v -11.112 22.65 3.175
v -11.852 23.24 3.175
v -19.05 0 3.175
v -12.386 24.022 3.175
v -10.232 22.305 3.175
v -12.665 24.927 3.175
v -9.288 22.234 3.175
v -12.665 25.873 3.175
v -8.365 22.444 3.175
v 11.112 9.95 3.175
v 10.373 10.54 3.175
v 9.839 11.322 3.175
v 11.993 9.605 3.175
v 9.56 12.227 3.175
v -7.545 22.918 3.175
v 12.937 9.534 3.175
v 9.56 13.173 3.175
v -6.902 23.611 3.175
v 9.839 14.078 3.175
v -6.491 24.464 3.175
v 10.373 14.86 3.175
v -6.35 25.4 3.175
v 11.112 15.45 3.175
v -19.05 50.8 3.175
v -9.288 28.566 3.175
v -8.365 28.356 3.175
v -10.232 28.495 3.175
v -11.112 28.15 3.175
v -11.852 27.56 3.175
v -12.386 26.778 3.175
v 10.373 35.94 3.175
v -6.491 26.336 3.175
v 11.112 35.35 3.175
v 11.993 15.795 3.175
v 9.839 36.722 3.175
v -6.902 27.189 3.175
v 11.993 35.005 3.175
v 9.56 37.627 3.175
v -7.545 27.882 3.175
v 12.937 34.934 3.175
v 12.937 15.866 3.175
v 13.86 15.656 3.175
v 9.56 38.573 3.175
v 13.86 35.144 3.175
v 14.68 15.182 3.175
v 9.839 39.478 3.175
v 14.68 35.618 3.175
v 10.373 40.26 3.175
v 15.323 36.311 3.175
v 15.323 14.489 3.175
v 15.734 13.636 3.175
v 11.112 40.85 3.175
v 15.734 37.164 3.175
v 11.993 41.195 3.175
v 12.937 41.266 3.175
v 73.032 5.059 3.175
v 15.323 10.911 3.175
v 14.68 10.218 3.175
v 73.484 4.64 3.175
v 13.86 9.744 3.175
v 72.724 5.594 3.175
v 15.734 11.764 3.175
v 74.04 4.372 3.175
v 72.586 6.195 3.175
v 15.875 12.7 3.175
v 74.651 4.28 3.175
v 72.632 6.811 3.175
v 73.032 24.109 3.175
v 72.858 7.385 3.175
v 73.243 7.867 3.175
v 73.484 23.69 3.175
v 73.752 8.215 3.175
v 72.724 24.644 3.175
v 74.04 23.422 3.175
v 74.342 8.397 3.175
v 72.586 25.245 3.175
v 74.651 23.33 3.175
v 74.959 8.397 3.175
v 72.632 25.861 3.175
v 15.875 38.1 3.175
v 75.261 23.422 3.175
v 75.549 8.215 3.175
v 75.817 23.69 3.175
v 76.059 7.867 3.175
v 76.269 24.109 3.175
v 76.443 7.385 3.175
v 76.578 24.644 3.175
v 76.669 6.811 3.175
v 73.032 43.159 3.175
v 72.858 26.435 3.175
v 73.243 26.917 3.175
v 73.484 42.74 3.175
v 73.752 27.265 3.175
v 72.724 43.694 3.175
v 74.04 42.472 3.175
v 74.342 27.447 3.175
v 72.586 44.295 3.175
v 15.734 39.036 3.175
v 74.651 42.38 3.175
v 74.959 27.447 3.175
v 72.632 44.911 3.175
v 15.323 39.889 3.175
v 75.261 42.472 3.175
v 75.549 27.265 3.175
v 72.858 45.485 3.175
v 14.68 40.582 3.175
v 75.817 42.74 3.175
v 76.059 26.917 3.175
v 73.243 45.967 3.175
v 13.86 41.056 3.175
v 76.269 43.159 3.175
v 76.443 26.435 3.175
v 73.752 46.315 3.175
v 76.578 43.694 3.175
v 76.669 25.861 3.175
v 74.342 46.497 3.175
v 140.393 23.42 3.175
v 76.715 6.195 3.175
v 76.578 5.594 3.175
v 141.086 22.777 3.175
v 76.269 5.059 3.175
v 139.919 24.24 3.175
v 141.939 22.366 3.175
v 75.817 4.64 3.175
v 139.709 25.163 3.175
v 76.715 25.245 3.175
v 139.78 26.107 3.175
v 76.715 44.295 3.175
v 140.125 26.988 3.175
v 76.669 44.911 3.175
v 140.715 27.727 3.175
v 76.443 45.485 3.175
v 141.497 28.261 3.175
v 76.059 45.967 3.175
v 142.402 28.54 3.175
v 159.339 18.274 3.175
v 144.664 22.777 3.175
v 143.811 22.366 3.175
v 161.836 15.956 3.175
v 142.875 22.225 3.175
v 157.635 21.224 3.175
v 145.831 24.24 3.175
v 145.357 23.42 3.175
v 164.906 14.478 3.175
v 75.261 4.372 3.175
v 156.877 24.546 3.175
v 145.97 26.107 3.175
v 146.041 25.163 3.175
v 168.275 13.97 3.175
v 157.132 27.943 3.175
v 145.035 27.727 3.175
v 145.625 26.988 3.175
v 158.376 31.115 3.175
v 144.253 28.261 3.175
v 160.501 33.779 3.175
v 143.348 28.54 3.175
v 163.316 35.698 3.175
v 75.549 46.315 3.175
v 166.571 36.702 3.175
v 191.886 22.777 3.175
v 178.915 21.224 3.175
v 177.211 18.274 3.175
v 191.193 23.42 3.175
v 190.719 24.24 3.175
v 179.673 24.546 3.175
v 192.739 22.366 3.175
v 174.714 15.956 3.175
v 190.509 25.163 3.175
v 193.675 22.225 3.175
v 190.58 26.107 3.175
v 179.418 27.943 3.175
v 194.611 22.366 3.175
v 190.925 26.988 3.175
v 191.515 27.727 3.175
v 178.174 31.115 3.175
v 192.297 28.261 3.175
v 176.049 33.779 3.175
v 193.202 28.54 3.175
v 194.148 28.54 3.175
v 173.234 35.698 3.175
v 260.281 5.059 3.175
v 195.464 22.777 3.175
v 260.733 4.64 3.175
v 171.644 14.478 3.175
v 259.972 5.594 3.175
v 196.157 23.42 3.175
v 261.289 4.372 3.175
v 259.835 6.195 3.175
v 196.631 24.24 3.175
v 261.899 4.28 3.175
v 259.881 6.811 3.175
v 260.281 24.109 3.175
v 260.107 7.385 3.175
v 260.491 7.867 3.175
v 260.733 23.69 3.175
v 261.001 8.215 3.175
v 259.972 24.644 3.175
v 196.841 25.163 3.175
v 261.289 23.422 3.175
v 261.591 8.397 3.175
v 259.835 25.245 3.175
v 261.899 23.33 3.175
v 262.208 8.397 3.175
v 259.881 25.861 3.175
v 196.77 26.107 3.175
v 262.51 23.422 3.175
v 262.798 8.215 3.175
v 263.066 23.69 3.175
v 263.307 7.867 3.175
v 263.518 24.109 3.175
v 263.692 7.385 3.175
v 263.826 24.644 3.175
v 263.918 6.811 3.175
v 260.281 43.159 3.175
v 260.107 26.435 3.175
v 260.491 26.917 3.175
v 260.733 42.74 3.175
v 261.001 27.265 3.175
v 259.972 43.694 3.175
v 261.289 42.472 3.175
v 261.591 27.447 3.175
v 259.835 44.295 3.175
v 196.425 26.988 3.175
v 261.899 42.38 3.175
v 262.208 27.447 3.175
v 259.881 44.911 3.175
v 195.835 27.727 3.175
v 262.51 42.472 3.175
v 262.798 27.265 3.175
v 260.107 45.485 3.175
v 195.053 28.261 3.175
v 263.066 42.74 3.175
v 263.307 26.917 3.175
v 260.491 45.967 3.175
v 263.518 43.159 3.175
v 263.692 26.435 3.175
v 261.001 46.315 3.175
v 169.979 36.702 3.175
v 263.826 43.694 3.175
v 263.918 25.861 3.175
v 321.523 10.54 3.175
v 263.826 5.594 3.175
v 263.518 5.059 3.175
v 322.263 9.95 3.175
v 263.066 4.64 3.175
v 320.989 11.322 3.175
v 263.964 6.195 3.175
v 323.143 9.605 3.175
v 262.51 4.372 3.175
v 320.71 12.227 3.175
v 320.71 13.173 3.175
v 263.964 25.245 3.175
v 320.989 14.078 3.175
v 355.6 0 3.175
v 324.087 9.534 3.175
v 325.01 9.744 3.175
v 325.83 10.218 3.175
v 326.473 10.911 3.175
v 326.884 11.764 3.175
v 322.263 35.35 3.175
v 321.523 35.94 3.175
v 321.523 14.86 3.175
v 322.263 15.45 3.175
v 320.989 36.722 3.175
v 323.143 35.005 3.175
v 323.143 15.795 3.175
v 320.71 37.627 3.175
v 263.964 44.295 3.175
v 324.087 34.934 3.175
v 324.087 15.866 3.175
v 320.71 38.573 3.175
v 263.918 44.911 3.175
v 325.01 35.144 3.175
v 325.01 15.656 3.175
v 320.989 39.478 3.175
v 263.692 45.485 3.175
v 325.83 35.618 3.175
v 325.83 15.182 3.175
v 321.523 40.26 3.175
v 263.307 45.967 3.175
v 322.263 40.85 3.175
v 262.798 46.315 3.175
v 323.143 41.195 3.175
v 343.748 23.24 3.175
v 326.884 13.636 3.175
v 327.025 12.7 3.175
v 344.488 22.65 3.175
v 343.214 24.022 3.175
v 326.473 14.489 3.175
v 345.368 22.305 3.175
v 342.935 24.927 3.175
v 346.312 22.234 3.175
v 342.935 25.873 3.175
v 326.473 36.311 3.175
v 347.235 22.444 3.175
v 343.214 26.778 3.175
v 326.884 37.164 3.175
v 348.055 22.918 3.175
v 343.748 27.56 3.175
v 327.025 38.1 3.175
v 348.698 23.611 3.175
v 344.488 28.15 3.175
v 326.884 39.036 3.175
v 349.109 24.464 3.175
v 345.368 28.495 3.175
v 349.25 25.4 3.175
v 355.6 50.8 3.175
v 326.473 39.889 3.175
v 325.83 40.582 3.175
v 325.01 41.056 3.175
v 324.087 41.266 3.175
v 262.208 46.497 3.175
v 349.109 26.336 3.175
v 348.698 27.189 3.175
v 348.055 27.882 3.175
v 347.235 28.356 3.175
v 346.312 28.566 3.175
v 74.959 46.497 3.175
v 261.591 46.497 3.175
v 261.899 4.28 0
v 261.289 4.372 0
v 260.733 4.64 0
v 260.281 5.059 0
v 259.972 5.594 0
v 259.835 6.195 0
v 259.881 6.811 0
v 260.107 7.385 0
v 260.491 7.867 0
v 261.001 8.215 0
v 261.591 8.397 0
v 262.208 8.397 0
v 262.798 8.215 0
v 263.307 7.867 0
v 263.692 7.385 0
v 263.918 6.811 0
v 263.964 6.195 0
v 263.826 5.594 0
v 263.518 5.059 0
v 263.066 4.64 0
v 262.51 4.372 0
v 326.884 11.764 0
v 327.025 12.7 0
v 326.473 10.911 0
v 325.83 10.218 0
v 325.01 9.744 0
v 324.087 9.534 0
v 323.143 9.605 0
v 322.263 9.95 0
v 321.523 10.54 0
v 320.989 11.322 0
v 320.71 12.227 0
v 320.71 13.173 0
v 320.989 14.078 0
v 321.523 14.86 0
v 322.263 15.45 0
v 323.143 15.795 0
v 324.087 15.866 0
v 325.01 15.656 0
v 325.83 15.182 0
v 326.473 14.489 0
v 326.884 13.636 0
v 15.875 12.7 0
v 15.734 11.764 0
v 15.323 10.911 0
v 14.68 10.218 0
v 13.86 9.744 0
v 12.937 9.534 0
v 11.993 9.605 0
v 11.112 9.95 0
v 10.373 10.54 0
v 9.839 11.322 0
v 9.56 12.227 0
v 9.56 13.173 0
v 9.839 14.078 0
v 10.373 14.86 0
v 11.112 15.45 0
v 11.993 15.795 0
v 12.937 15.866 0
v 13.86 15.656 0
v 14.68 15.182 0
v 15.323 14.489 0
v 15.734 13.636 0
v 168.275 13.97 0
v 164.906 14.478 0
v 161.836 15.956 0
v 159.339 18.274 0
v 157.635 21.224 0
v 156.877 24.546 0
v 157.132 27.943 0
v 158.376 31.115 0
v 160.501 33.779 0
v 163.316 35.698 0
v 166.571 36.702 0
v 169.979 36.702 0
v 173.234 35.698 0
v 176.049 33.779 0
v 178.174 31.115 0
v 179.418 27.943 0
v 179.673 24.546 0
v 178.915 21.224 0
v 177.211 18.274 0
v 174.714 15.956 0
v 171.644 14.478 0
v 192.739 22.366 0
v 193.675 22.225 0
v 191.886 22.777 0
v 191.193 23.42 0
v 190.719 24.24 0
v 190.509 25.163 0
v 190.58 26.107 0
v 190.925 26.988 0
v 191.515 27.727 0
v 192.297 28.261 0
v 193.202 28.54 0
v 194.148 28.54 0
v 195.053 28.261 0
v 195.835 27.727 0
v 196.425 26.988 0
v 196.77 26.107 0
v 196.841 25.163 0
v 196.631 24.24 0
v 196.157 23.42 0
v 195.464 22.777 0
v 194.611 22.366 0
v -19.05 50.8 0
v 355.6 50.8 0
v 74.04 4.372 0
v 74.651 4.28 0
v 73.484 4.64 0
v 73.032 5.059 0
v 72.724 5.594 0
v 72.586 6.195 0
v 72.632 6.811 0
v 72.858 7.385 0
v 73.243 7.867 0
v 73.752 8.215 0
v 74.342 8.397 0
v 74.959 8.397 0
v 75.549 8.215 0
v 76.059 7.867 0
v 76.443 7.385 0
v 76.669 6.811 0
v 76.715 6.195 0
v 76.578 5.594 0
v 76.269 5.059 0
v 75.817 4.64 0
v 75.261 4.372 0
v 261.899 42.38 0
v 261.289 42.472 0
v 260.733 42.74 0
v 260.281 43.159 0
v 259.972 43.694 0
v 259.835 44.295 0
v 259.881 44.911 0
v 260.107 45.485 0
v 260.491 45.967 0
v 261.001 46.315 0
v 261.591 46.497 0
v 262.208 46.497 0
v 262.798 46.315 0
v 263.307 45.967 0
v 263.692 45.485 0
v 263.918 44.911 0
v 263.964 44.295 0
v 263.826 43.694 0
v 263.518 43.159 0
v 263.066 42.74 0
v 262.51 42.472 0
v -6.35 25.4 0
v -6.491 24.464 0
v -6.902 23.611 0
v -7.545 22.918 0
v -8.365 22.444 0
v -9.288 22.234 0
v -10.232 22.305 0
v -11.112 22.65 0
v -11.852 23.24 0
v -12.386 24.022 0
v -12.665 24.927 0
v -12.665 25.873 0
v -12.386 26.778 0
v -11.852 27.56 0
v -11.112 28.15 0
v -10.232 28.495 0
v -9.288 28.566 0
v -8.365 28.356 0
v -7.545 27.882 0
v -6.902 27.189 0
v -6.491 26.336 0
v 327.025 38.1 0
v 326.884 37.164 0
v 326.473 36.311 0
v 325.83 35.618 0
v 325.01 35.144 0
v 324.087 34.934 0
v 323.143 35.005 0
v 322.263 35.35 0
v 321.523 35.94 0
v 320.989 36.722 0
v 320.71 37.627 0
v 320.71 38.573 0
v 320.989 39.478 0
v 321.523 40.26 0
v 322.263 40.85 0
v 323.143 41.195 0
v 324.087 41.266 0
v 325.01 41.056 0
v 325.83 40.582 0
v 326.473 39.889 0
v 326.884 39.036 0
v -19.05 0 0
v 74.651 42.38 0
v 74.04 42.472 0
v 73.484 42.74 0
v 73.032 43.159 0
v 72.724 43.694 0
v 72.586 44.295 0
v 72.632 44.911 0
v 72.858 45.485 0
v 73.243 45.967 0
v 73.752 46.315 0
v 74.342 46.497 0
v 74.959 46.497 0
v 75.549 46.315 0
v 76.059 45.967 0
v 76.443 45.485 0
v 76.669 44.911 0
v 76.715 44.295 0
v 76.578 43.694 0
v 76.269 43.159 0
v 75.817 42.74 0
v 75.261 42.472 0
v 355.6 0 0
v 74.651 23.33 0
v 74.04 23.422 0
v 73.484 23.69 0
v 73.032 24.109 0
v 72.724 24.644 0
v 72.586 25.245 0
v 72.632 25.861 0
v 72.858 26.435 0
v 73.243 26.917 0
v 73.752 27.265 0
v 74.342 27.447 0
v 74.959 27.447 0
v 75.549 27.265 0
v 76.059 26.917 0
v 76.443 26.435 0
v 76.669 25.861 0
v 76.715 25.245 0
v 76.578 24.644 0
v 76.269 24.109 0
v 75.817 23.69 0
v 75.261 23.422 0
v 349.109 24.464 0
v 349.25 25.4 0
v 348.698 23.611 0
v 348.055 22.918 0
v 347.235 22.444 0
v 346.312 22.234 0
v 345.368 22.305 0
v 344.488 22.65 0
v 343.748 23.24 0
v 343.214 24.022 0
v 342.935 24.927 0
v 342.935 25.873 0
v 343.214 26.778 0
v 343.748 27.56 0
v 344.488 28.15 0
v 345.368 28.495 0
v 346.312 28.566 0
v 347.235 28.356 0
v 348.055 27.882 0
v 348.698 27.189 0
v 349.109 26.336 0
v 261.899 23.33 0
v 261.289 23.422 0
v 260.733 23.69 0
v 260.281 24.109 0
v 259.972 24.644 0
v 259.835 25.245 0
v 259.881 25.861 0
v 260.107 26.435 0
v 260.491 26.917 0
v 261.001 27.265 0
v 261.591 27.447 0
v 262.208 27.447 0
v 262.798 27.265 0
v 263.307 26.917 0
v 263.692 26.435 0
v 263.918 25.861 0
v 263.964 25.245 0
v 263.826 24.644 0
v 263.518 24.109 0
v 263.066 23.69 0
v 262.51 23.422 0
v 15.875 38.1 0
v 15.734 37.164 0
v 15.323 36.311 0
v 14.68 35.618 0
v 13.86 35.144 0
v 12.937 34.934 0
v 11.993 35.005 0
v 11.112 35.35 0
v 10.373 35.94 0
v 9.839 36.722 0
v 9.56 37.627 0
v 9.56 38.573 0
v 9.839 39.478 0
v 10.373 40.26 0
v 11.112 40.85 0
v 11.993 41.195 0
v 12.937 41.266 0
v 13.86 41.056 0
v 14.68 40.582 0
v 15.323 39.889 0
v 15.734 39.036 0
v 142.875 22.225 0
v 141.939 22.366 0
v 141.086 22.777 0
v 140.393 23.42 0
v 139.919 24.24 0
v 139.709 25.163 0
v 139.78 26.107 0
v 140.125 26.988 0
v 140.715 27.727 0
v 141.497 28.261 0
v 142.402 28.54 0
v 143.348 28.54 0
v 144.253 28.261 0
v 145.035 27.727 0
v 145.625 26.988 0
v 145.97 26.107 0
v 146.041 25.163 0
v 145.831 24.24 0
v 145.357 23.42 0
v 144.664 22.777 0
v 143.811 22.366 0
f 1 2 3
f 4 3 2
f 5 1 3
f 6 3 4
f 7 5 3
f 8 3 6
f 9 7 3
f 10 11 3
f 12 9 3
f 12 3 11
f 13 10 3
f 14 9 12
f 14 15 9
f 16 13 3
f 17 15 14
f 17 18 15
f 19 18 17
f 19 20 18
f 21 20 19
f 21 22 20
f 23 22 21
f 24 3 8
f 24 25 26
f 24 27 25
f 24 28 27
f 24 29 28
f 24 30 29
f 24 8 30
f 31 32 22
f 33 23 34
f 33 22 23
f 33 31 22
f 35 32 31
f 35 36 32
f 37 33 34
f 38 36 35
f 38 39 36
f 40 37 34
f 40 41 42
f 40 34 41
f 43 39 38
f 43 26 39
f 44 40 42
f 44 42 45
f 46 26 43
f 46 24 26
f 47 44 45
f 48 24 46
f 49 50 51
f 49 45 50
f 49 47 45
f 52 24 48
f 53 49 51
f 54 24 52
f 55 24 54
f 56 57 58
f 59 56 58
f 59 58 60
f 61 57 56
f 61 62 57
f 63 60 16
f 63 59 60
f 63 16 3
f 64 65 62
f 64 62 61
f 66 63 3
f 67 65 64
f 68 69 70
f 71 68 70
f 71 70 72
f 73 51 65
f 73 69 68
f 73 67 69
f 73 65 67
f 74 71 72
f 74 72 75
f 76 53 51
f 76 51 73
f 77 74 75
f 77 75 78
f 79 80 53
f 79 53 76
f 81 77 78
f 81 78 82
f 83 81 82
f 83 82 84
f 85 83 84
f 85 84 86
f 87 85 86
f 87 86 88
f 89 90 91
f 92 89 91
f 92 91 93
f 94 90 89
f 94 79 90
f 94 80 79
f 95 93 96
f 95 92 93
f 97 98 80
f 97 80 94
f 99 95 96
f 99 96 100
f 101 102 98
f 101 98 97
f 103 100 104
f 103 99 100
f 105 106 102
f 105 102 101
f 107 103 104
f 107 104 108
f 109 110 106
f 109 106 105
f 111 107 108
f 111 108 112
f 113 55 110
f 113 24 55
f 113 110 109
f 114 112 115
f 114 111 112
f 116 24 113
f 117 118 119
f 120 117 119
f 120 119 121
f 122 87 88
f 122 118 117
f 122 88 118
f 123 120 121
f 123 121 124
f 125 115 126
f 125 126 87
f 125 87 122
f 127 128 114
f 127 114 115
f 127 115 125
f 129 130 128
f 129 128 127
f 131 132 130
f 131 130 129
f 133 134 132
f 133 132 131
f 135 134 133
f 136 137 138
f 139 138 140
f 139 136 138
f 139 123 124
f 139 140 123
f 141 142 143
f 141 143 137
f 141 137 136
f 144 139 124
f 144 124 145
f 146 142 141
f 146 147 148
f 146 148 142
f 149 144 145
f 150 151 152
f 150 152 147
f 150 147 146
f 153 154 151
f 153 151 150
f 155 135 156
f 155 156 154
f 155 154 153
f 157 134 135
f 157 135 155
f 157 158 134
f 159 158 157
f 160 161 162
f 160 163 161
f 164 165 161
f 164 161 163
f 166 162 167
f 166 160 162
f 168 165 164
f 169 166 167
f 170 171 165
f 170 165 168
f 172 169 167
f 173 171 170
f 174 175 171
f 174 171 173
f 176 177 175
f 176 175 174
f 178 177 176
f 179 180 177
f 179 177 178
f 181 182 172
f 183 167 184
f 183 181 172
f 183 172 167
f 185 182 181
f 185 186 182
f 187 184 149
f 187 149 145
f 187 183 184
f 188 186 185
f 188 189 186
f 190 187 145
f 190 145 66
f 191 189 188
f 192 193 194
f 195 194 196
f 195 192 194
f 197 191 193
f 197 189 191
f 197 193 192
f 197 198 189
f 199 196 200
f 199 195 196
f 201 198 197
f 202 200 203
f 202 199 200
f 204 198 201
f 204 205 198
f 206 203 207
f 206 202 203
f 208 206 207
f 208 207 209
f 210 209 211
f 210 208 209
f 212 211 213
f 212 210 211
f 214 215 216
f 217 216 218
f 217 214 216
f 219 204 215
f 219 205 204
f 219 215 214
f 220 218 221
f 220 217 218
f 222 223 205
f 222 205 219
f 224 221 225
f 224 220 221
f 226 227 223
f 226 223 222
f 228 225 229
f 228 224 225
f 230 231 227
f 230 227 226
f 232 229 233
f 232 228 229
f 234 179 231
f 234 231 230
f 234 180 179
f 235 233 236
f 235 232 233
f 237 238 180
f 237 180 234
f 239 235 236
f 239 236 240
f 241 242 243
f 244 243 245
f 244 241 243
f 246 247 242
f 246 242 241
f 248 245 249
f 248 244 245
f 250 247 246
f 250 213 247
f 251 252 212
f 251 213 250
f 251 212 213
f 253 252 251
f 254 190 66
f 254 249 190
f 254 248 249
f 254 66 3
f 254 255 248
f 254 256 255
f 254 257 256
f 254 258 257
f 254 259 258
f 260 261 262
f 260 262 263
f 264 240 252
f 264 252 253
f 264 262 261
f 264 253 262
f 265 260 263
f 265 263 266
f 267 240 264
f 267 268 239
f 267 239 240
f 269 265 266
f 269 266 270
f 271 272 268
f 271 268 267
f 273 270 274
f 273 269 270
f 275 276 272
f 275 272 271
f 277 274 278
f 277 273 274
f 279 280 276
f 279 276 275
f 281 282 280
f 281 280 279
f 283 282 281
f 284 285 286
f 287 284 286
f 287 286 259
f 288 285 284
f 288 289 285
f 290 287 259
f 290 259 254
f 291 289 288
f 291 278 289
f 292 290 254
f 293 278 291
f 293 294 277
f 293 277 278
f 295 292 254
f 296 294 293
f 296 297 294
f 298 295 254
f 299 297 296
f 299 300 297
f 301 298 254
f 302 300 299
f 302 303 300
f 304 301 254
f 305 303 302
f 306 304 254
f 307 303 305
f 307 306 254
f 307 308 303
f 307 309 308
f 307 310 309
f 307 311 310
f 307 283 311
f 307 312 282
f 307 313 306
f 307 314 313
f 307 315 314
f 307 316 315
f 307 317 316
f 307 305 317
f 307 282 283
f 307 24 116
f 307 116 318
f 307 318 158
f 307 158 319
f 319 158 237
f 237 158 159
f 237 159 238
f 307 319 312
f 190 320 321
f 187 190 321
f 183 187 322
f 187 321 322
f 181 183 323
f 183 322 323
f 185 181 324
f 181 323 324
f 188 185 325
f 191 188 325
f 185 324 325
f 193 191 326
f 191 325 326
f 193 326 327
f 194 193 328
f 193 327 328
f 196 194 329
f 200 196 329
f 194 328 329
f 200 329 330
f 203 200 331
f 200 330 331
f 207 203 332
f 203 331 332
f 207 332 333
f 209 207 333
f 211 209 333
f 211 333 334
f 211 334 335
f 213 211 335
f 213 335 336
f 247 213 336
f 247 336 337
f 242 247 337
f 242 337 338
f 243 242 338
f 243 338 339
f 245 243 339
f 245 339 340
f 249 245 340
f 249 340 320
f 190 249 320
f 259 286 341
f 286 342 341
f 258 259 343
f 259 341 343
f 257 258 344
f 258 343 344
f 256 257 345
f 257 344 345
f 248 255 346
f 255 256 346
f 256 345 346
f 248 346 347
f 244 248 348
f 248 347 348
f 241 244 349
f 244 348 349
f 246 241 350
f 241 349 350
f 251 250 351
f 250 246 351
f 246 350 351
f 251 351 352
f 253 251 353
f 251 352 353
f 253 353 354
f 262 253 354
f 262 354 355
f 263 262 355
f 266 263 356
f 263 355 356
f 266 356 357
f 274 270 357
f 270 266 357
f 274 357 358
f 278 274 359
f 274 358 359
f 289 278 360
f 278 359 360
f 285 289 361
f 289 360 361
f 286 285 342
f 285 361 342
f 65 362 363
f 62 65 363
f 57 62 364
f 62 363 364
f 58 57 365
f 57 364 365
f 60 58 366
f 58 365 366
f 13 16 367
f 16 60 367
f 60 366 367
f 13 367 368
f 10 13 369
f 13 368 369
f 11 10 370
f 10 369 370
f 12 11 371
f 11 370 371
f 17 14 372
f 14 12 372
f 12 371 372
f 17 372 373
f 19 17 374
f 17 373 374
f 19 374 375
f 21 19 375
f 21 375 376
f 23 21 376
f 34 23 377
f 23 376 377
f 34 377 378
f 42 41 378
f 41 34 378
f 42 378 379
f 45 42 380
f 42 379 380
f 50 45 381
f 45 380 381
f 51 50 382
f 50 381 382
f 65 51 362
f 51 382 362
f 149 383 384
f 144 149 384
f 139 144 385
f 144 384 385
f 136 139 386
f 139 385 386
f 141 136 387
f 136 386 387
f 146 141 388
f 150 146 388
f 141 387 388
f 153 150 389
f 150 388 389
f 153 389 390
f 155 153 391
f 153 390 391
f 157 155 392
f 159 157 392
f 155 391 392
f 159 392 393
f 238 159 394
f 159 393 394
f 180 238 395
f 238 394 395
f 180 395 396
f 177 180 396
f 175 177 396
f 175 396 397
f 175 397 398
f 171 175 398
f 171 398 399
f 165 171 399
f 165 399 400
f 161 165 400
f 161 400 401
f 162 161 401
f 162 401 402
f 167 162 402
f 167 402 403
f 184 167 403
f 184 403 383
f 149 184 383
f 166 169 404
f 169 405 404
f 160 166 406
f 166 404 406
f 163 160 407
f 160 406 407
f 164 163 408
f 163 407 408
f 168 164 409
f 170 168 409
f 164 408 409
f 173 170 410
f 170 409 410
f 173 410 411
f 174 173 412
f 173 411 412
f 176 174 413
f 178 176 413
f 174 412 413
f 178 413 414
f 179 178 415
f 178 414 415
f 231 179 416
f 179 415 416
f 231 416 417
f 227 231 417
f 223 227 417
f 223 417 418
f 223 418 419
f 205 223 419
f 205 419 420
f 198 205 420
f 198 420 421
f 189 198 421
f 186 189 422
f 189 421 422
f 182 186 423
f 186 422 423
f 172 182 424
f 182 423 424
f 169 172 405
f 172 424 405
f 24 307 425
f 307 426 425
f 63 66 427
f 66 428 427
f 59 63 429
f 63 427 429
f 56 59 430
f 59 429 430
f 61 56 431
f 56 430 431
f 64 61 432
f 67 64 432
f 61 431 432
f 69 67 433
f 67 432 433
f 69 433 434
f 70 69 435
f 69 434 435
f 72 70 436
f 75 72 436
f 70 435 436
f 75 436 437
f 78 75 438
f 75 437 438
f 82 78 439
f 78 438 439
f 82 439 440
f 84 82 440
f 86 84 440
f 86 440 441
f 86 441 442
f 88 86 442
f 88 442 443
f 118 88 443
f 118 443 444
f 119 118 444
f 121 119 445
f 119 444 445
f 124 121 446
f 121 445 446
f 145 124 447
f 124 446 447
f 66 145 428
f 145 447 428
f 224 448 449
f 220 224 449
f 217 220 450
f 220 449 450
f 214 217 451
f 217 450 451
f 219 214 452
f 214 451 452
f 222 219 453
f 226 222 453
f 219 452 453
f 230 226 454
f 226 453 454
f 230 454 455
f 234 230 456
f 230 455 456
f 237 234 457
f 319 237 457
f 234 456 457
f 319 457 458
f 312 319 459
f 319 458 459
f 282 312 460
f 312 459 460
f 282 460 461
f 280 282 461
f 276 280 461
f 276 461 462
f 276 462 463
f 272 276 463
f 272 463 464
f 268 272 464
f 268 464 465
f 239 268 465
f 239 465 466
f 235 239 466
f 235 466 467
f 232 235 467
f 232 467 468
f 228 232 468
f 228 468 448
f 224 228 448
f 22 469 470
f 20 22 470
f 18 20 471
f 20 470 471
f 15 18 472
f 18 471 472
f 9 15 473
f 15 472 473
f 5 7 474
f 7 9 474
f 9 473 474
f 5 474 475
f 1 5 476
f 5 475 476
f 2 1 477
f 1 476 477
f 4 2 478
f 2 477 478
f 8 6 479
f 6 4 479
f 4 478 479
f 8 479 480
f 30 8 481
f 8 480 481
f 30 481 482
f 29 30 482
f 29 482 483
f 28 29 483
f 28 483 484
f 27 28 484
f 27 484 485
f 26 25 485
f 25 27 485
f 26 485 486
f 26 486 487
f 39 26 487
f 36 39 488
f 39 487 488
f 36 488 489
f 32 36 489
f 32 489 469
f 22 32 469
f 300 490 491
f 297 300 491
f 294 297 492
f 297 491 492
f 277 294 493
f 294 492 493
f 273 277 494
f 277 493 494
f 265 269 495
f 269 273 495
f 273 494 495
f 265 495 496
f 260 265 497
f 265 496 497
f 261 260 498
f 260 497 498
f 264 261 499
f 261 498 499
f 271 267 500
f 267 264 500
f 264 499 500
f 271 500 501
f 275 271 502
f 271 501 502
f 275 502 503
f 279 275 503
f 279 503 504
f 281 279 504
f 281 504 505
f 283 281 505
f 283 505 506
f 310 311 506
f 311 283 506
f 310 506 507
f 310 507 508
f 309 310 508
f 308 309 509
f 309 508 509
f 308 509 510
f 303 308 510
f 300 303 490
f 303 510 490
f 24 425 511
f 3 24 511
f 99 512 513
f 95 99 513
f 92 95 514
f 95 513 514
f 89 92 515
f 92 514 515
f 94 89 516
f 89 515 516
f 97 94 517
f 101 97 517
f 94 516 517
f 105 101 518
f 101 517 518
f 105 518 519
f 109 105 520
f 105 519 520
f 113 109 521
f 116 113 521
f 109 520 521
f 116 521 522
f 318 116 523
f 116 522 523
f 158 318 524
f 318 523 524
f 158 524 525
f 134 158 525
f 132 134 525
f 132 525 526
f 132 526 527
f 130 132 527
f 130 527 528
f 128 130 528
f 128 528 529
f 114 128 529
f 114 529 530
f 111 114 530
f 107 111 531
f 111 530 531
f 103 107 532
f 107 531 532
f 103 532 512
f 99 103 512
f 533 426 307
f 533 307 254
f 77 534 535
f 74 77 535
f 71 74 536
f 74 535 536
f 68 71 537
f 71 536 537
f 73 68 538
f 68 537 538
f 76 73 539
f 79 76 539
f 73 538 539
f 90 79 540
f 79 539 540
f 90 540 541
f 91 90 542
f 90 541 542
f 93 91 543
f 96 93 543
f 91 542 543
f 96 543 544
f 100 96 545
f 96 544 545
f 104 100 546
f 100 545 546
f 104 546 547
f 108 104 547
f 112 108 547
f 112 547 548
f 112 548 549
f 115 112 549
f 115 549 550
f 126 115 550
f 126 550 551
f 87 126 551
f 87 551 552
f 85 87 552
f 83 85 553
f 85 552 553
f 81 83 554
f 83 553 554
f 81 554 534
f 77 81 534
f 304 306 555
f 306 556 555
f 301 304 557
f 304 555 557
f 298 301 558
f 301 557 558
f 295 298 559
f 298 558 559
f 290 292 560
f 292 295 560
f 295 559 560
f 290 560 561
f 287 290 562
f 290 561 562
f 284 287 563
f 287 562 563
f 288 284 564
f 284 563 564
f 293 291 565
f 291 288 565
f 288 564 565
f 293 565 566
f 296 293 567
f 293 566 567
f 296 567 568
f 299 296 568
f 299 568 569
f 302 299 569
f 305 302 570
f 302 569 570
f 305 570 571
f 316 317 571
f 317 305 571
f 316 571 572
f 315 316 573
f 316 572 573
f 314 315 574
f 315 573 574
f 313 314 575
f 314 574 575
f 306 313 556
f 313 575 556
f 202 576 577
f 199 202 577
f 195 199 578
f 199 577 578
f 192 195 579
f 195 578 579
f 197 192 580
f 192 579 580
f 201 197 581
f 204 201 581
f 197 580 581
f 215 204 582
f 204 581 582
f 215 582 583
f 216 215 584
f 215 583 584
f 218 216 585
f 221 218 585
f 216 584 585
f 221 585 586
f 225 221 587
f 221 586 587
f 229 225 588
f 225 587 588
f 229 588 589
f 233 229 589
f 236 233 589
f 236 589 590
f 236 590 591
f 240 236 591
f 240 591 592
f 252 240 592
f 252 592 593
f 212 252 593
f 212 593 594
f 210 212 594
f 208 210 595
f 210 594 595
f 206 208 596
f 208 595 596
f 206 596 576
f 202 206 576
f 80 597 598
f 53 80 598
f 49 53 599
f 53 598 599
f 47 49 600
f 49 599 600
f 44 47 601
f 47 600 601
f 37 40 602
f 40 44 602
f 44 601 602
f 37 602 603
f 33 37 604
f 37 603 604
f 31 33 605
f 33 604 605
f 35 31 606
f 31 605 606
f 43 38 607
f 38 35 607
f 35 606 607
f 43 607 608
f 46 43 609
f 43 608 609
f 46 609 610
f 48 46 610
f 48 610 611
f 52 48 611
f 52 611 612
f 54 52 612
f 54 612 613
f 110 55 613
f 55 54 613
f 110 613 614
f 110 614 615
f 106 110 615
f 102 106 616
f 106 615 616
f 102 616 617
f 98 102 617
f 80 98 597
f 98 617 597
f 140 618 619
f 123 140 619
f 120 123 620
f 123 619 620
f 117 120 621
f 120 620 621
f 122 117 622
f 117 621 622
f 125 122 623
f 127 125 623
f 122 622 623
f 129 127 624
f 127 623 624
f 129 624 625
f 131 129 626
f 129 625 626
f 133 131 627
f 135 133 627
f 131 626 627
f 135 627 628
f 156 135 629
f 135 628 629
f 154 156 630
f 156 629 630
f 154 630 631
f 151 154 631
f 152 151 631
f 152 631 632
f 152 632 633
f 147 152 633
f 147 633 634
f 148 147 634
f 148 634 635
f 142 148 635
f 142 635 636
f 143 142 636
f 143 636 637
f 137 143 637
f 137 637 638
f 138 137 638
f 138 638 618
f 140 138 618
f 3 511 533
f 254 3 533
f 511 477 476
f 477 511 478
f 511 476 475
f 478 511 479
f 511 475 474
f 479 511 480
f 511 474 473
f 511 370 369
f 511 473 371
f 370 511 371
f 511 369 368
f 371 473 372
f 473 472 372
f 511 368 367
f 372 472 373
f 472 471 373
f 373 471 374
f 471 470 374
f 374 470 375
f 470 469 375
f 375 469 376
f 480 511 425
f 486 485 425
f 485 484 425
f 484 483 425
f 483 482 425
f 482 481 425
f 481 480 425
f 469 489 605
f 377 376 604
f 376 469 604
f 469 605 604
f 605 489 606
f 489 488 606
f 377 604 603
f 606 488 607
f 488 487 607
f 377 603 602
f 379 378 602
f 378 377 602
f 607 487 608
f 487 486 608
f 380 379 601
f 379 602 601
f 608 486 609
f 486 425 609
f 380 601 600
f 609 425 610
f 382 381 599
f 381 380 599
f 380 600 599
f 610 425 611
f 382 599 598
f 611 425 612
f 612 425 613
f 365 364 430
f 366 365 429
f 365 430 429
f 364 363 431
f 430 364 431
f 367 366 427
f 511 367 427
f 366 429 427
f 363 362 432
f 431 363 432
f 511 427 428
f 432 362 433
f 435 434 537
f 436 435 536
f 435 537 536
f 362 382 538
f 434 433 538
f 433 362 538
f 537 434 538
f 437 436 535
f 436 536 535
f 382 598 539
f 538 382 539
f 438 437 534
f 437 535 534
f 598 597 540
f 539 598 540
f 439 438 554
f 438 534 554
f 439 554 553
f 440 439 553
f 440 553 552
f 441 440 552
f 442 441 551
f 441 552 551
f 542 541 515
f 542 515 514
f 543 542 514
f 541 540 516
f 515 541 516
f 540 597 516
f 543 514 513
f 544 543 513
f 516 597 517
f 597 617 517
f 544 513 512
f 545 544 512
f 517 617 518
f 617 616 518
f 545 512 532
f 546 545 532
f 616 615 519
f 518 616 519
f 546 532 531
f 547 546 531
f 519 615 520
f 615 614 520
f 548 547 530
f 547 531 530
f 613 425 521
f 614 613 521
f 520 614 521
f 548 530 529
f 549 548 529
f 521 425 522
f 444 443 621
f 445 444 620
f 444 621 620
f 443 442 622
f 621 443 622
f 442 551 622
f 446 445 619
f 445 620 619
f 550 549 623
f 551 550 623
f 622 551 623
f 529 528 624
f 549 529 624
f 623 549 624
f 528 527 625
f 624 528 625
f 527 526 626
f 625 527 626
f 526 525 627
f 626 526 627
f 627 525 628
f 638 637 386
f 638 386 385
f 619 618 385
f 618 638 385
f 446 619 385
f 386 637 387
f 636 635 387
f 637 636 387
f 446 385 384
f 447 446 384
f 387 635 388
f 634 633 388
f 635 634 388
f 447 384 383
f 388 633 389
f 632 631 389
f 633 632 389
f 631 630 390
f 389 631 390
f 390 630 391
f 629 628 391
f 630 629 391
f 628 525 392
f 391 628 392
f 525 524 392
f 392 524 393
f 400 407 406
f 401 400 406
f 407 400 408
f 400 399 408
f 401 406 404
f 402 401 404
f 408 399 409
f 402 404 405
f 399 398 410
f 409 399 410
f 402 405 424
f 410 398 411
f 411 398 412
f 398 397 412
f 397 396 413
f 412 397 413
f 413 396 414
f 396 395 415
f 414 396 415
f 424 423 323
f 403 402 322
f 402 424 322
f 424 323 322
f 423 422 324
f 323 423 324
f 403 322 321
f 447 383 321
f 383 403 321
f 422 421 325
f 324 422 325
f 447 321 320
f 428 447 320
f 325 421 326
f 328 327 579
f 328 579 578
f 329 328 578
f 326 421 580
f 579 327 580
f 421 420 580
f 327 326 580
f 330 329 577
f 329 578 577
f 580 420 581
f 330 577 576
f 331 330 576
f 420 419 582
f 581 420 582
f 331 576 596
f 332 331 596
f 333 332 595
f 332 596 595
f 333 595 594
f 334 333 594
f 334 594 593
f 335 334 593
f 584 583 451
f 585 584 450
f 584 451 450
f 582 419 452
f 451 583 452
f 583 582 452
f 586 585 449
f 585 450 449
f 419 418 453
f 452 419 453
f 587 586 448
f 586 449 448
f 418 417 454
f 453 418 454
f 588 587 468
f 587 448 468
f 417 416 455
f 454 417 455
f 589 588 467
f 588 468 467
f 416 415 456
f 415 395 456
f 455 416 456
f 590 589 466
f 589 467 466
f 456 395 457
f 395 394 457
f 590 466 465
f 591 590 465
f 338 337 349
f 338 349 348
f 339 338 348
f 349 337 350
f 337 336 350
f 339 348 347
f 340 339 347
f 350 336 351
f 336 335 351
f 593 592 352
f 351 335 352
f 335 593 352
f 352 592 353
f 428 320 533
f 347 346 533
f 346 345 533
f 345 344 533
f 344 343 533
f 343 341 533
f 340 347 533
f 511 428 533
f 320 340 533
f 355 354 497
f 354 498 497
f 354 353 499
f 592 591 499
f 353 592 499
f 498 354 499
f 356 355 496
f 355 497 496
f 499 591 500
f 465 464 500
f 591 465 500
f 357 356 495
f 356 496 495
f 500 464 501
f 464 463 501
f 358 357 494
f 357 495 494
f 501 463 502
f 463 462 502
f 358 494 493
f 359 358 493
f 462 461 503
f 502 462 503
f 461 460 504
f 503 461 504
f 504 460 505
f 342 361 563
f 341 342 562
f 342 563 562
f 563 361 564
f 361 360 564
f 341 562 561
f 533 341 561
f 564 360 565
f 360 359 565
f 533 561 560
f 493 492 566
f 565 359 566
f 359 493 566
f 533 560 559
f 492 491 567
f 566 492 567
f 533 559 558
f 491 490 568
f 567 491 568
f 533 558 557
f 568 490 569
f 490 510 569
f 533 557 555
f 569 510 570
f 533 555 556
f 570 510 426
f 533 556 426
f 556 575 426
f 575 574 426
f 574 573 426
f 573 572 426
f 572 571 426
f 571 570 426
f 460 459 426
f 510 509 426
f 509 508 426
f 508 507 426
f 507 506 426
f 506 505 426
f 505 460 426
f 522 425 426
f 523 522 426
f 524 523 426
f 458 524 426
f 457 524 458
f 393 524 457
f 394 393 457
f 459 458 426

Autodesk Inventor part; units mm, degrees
ref_plane "YZ Plane" through (0, 0, 0) normal (1, 0, 0) x (0, 1, 0)
ref_plane "XZ Plane" through (0, 0, 0) normal (0, 1, 0) x (-1, 0, 0)
ref_plane "XY Plane" through (0, 0, 0) normal (0, 0, 1) x (1, 0, 0)
sketch "Sketch1" plane through (0, 0, 0) normal (0, 0, 1) x (1, 0, 0)
  line L0 (355.6, 50.8) -> (-19.05, 50.8)
  line L1 (12.7, 50.8) -> (12.7, 0) construction
  line L2 (0, 38.1) -> (12.7, 38.1) construction
  line L3 (0, 12.7) -> (12.7, 12.7) construction
  circle A0 centre (12.7, 38.1) radius 3.175
  circle A1 centre (12.7, 12.7) radius 3.175
  line L4 (168.275, 50.8) -> (168.275, 0) construction
  line L5 (-19.05, 50.8) -> (-19.05, 0)
  line L6 (355.6, 50.8) -> (355.6, 0)
  circle A2 centre (-9.525, 25.4) radius 3.175
  circle A3 centre (323.85, 38.1) radius 3.175
  circle A4 centre (323.85, 12.7) radius 3.175
  line L7 (355.6, 50.8) -> (355.6, 0)
  circle A5 centre (346.075, 25.4) radius 3.175
  line L8 (-19.05, 0) -> (355.6, 0)
  dimension "d0" = 374.65
  dimension "d3" = 12.7
  dimension "d4" = 25.4
  dimension "d5" = 6.35
  dimension "d6" = 6.35
  dimension "d10" = 6.35
  dimension "d11" = 31.75
extrude "Extrusion2" add sketch "Sketch1" along normal blind 3.175
sketch "Sketch3" plane through (0, 0, 3.175) normal (0, 0, 1) x (1, 0, 0)
  line L0 (-19.05, 50.8) -> (-19.05, 0) projected
  line L1 (-19.05, 25.4) -> (168.275, 25.4)
  line L2 (355.6, 50.8) -> (-19.05, 50.8) projected
  line L3 (168.275, 25.4) -> (168.275, 50.8)
  point P0 (0, 0)
hole "Hole1" at (168.275, 25.4, 3.175) direction (0, 0, -1) diameter 22.86 depth 25.4 tip angle 118
sketch "Sketch4" plane through (0, 0, 3.175) normal (0, 0, 1) x (1, 0, 0)
  circle A0 centre (168.275, 25.4) radius 11.43 projected
  line L0 (168.275, 25.4) -> (142.875, 25.4)
  circle A1 centre (142.875, 25.4) radius 3.175
  line L1 (355.6, 50.8) -> (-19.05, 50.8) projected
  line L2 (168.275, 50.8) -> (168.275, 0)
  circle A2 centre (193.675, 25.4) radius 3.175
  point P0 (0, 0)
  dimension "d21" = 25.4
  dimension "d22" = 6.35
hole "Hole2" at (193.675, 25.4, 3.175) at (142.875, 25.4, 3.175) direction (0, 0, -1) diameter 6.35 depth 25.4 tip angle 118
sketch "Sketch5" plane through (0, 0, 3.175) normal (0, 0, 1) x (1, 0, 0)
  line L0 (355.6, 50.8) -> (-19.05, 50.8) projected
  line L1 (74.6506, 50.8) -> (74.6506, 0)
  line L2 (-19.05, 50.8) -> (-19.05, 0) projected
  line L3 (74.6506, 50.8) -> (74.6506, 44.45)
  line L4 (74.6506, 44.45) -> (74.6506, 25.4)
  circle A0 centre (74.6506, 44.45) radius 2.0701
  line L5 (74.6506, 25.4) -> (74.6506, 6.35)
  circle A1 centre (74.6506, 25.4) radius 2.0701
  circle A2 centre (74.6506, 6.35) radius 2.0701
  line L6 (168.275, 50.8) -> (168.275, 0)
  circle A3 centre (261.8994, 44.45) radius 2.0701
  circle A4 centre (261.8994, 25.4) radius 2.0701
  circle A5 centre (261.8994, 6.35) radius 2.0701
  point P0 (0, 0)
  dimension "d30" = 93.7006
  dimension "d31" = 6.35
  dimension "d32" = 19.05
  dimension "d33" = 4.1402
  dimension "d34" = 19.05
  dimension "d35" = 4.1402
  dimension "d36" = 4.1402
hole "Hole3" at (74.6506, 44.45, 3.175) at (74.6506, 25.4, 3.175) at (74.6506, 6.35, 3.175) at (261.8994, 44.45, 3.175) at (261.8994, 25.4, 3.175) at (261.8994, 6.35, 3.175) direction (0, 0, -1) diameter 4.1402 depth 25.4 tip angle 118
properties part number "slider-crossbeam" material "Aluminum 6061"
